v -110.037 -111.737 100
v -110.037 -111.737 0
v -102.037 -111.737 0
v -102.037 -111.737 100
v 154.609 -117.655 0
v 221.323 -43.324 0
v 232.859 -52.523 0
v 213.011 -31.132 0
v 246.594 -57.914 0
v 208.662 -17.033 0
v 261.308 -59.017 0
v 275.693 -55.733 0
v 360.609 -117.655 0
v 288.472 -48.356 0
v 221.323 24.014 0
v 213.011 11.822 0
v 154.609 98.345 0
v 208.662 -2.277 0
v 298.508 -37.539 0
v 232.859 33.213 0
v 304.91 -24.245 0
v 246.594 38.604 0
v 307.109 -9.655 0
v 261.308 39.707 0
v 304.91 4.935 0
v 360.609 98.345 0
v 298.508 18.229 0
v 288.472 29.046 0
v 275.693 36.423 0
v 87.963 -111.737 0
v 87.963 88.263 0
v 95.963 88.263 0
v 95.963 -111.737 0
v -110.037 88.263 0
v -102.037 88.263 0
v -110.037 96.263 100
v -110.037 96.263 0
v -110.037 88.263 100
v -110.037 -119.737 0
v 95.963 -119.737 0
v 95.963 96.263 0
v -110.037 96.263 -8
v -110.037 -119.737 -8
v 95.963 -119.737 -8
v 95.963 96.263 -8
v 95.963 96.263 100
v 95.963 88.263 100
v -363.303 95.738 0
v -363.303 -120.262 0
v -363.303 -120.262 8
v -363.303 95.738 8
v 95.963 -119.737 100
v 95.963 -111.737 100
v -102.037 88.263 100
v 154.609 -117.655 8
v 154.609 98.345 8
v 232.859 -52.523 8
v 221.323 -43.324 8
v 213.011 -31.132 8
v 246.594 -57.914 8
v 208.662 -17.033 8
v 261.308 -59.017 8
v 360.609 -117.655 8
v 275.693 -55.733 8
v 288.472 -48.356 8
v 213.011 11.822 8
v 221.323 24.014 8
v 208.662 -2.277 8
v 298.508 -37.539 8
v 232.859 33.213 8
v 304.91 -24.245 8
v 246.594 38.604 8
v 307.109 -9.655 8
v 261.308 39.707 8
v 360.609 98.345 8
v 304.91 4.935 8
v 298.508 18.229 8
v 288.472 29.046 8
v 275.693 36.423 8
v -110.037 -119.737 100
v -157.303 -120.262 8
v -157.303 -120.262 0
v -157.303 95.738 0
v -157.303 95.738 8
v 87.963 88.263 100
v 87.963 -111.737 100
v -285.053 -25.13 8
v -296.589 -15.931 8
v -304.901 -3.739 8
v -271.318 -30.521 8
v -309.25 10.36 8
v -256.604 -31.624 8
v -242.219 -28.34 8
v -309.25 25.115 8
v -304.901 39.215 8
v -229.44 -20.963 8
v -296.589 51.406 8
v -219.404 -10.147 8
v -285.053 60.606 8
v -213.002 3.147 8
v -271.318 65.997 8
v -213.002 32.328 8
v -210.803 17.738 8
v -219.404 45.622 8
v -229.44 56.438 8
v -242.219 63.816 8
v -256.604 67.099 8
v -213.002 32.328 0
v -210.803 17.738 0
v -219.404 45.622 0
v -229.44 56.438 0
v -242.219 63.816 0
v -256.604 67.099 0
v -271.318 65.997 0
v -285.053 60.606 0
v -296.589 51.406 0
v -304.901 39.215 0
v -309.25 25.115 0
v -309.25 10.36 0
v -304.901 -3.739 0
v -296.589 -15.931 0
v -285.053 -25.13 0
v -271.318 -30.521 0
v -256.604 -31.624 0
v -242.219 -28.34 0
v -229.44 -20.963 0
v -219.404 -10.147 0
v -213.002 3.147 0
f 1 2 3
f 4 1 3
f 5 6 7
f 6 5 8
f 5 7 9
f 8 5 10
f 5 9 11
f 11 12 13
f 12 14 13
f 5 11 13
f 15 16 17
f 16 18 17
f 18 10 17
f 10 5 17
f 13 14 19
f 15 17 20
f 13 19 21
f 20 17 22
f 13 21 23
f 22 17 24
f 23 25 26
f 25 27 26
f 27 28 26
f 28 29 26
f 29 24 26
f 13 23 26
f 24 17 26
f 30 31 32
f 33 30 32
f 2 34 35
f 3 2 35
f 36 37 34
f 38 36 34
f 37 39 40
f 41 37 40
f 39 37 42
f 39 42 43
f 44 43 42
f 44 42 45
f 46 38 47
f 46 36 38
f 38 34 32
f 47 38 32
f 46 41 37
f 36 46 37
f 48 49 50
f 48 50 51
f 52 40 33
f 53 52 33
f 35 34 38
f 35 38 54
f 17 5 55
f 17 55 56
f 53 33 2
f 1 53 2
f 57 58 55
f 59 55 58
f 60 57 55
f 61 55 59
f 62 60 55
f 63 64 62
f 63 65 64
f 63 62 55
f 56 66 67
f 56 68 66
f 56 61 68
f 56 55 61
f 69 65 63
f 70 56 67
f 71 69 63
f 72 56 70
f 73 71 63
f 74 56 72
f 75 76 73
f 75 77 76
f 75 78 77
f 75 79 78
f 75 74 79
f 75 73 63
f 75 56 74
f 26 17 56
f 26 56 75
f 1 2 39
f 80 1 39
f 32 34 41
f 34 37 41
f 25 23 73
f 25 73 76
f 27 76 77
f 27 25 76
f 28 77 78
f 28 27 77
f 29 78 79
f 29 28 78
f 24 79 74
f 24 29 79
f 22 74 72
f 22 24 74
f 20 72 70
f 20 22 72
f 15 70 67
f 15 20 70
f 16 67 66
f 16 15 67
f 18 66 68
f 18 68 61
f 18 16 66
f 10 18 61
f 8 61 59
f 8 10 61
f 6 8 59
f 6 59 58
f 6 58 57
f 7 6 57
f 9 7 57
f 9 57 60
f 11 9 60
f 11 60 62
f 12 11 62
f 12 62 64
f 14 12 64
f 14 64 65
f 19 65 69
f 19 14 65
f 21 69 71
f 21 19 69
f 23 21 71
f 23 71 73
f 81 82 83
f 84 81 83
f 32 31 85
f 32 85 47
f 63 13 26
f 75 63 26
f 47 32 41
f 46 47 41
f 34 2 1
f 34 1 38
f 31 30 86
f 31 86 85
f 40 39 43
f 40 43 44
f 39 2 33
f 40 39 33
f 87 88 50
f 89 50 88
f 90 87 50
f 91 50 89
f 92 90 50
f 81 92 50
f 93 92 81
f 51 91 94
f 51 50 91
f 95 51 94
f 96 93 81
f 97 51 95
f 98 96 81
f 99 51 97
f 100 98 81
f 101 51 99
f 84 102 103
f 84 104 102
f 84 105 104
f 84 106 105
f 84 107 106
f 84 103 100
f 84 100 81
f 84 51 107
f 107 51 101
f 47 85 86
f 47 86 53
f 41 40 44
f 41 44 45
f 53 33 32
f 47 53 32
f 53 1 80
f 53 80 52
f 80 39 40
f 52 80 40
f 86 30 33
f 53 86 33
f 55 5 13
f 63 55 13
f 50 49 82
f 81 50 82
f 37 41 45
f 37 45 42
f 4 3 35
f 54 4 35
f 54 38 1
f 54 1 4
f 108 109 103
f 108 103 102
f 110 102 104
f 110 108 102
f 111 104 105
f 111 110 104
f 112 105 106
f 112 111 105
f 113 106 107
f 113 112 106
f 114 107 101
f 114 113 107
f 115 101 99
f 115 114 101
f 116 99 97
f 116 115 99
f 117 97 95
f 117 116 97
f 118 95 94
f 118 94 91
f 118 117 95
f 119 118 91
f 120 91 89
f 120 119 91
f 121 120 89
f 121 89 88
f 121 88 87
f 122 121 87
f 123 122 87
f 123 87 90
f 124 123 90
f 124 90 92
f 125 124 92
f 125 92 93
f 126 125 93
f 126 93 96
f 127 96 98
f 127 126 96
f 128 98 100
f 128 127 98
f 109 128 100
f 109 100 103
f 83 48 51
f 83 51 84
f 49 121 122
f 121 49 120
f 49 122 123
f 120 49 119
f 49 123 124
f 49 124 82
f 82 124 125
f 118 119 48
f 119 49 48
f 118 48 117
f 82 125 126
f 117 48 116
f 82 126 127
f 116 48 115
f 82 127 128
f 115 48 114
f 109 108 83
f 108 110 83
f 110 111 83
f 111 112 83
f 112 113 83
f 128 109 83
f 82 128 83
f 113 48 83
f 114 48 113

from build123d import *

# Parameters (mm, degrees)
F3_DEPTH = 100
F2_W     = 8
F2_H     = 200
F4_DEPTH = 100
F2_W_2   = 190
F5_DEPTH = 8
F2_W_3   = 206
F2_H_2   = 216
F2_R     = 49.5
F6_DEPTH = 8
F7_DEPTH = 8


with BuildPart() as f3:
    # F2 (on Top) → F3 (new body)
    with BuildSketch(Plane.XY):
        Polygon((-110.0365072489, 88.2625139453), (-102.0365072489, 88.2625139453), (87.9634927511, 88.2625139453), (95.9634927511, 88.2625139453), (95.9634927511, 96.2625139453), (-110.0365072489, 96.2625139453), align=None)
    extrude(amount=F3_DEPTH)


with BuildPart() as f3b:
    # F2 (on Top) → F3, piece 2 (new body)
    with BuildSketch(Plane.XY):
        Polygon((87.9634927511, -111.7374860547), (-102.0365072489, -111.7374860547), (-110.0365072489, -111.7374860547), (-110.0365072489, -119.7374860547), (95.9634927511, -119.7374860547), (95.9634927511, -111.7374860547), align=None)
    extrude(amount=F3_DEPTH)


with BuildPart() as f4:
    # F2 (on Top) → F4 (new body)
    with BuildSketch(Plane.XY):
        with Locations((-106.0365072489, -11.7374860547)):
            Rectangle(F2_W, F2_H)
    extrude(amount=F4_DEPTH)


with BuildPart() as f4b:
    # F2 (on Top) → F4, piece 2 (new body)
    with BuildSketch(Plane.XY):
        with Locations((91.9634927511, -11.7374860547)):
            Rectangle(F2_W, F2_H)
    extrude(amount=F4_DEPTH)


with BuildPart() as f5:
    # F2 (on Top) → F5 (new body)
    with BuildSketch(Plane.XY):
        with Locations((91.9634927511, -11.7374860547)):
            Rectangle(F2_W, F2_H)
        Polygon((-110.0365072489, 88.2625139453), (-102.0365072489, 88.2625139453), (87.9634927511, 88.2625139453), (95.9634927511, 88.2625139453), (95.9634927511, 96.2625139453), (-110.0365072489, 96.2625139453), align=None)
        with Locations((-106.0365072489, -11.7374860547)):
            Rectangle(F2_W, F2_H)
        Polygon((87.9634927511, -111.7374860547), (-102.0365072489, -111.7374860547), (-110.0365072489, -111.7374860547), (-110.0365072489, -119.7374860547), (95.9634927511, -119.7374860547), (95.9634927511, -111.7374860547), align=None)
        with Locations((-7.0365072489, -11.7374860547)):
            Rectangle(F2_W_2, F2_H)
    extrude(amount=-F5_DEPTH)


with BuildPart() as f6:
    # F2 (on Top) → F6 (new body)
    with BuildSketch(Plane.XY):
        with Locations((-260.3030354977, -12.2621608973)):
            Rectangle(F2_W_3, F2_H_2)
        with Locations((-260.3030354977, 17.7378391027)):
            Circle(F2_R, mode=Mode.SUBTRACT)
    extrude(amount=F6_DEPTH)


with BuildPart() as f7:
    # F2 (on Top) → F7 (new body)
    with BuildSketch(Plane.XY):
        with Locations((257.6088457108, -9.6550388336)):
            Rectangle(F2_W_3, F2_H_2)
        with Locations((257.6088457108, -9.6550388336)):
            Circle(F2_R, mode=Mode.SUBTRACT)
    extrude(amount=F7_DEPTH)


solid = Compound([f3.part, f3b.part, f4.part, f4b.part, f5.part, f6.part, f7.part])
